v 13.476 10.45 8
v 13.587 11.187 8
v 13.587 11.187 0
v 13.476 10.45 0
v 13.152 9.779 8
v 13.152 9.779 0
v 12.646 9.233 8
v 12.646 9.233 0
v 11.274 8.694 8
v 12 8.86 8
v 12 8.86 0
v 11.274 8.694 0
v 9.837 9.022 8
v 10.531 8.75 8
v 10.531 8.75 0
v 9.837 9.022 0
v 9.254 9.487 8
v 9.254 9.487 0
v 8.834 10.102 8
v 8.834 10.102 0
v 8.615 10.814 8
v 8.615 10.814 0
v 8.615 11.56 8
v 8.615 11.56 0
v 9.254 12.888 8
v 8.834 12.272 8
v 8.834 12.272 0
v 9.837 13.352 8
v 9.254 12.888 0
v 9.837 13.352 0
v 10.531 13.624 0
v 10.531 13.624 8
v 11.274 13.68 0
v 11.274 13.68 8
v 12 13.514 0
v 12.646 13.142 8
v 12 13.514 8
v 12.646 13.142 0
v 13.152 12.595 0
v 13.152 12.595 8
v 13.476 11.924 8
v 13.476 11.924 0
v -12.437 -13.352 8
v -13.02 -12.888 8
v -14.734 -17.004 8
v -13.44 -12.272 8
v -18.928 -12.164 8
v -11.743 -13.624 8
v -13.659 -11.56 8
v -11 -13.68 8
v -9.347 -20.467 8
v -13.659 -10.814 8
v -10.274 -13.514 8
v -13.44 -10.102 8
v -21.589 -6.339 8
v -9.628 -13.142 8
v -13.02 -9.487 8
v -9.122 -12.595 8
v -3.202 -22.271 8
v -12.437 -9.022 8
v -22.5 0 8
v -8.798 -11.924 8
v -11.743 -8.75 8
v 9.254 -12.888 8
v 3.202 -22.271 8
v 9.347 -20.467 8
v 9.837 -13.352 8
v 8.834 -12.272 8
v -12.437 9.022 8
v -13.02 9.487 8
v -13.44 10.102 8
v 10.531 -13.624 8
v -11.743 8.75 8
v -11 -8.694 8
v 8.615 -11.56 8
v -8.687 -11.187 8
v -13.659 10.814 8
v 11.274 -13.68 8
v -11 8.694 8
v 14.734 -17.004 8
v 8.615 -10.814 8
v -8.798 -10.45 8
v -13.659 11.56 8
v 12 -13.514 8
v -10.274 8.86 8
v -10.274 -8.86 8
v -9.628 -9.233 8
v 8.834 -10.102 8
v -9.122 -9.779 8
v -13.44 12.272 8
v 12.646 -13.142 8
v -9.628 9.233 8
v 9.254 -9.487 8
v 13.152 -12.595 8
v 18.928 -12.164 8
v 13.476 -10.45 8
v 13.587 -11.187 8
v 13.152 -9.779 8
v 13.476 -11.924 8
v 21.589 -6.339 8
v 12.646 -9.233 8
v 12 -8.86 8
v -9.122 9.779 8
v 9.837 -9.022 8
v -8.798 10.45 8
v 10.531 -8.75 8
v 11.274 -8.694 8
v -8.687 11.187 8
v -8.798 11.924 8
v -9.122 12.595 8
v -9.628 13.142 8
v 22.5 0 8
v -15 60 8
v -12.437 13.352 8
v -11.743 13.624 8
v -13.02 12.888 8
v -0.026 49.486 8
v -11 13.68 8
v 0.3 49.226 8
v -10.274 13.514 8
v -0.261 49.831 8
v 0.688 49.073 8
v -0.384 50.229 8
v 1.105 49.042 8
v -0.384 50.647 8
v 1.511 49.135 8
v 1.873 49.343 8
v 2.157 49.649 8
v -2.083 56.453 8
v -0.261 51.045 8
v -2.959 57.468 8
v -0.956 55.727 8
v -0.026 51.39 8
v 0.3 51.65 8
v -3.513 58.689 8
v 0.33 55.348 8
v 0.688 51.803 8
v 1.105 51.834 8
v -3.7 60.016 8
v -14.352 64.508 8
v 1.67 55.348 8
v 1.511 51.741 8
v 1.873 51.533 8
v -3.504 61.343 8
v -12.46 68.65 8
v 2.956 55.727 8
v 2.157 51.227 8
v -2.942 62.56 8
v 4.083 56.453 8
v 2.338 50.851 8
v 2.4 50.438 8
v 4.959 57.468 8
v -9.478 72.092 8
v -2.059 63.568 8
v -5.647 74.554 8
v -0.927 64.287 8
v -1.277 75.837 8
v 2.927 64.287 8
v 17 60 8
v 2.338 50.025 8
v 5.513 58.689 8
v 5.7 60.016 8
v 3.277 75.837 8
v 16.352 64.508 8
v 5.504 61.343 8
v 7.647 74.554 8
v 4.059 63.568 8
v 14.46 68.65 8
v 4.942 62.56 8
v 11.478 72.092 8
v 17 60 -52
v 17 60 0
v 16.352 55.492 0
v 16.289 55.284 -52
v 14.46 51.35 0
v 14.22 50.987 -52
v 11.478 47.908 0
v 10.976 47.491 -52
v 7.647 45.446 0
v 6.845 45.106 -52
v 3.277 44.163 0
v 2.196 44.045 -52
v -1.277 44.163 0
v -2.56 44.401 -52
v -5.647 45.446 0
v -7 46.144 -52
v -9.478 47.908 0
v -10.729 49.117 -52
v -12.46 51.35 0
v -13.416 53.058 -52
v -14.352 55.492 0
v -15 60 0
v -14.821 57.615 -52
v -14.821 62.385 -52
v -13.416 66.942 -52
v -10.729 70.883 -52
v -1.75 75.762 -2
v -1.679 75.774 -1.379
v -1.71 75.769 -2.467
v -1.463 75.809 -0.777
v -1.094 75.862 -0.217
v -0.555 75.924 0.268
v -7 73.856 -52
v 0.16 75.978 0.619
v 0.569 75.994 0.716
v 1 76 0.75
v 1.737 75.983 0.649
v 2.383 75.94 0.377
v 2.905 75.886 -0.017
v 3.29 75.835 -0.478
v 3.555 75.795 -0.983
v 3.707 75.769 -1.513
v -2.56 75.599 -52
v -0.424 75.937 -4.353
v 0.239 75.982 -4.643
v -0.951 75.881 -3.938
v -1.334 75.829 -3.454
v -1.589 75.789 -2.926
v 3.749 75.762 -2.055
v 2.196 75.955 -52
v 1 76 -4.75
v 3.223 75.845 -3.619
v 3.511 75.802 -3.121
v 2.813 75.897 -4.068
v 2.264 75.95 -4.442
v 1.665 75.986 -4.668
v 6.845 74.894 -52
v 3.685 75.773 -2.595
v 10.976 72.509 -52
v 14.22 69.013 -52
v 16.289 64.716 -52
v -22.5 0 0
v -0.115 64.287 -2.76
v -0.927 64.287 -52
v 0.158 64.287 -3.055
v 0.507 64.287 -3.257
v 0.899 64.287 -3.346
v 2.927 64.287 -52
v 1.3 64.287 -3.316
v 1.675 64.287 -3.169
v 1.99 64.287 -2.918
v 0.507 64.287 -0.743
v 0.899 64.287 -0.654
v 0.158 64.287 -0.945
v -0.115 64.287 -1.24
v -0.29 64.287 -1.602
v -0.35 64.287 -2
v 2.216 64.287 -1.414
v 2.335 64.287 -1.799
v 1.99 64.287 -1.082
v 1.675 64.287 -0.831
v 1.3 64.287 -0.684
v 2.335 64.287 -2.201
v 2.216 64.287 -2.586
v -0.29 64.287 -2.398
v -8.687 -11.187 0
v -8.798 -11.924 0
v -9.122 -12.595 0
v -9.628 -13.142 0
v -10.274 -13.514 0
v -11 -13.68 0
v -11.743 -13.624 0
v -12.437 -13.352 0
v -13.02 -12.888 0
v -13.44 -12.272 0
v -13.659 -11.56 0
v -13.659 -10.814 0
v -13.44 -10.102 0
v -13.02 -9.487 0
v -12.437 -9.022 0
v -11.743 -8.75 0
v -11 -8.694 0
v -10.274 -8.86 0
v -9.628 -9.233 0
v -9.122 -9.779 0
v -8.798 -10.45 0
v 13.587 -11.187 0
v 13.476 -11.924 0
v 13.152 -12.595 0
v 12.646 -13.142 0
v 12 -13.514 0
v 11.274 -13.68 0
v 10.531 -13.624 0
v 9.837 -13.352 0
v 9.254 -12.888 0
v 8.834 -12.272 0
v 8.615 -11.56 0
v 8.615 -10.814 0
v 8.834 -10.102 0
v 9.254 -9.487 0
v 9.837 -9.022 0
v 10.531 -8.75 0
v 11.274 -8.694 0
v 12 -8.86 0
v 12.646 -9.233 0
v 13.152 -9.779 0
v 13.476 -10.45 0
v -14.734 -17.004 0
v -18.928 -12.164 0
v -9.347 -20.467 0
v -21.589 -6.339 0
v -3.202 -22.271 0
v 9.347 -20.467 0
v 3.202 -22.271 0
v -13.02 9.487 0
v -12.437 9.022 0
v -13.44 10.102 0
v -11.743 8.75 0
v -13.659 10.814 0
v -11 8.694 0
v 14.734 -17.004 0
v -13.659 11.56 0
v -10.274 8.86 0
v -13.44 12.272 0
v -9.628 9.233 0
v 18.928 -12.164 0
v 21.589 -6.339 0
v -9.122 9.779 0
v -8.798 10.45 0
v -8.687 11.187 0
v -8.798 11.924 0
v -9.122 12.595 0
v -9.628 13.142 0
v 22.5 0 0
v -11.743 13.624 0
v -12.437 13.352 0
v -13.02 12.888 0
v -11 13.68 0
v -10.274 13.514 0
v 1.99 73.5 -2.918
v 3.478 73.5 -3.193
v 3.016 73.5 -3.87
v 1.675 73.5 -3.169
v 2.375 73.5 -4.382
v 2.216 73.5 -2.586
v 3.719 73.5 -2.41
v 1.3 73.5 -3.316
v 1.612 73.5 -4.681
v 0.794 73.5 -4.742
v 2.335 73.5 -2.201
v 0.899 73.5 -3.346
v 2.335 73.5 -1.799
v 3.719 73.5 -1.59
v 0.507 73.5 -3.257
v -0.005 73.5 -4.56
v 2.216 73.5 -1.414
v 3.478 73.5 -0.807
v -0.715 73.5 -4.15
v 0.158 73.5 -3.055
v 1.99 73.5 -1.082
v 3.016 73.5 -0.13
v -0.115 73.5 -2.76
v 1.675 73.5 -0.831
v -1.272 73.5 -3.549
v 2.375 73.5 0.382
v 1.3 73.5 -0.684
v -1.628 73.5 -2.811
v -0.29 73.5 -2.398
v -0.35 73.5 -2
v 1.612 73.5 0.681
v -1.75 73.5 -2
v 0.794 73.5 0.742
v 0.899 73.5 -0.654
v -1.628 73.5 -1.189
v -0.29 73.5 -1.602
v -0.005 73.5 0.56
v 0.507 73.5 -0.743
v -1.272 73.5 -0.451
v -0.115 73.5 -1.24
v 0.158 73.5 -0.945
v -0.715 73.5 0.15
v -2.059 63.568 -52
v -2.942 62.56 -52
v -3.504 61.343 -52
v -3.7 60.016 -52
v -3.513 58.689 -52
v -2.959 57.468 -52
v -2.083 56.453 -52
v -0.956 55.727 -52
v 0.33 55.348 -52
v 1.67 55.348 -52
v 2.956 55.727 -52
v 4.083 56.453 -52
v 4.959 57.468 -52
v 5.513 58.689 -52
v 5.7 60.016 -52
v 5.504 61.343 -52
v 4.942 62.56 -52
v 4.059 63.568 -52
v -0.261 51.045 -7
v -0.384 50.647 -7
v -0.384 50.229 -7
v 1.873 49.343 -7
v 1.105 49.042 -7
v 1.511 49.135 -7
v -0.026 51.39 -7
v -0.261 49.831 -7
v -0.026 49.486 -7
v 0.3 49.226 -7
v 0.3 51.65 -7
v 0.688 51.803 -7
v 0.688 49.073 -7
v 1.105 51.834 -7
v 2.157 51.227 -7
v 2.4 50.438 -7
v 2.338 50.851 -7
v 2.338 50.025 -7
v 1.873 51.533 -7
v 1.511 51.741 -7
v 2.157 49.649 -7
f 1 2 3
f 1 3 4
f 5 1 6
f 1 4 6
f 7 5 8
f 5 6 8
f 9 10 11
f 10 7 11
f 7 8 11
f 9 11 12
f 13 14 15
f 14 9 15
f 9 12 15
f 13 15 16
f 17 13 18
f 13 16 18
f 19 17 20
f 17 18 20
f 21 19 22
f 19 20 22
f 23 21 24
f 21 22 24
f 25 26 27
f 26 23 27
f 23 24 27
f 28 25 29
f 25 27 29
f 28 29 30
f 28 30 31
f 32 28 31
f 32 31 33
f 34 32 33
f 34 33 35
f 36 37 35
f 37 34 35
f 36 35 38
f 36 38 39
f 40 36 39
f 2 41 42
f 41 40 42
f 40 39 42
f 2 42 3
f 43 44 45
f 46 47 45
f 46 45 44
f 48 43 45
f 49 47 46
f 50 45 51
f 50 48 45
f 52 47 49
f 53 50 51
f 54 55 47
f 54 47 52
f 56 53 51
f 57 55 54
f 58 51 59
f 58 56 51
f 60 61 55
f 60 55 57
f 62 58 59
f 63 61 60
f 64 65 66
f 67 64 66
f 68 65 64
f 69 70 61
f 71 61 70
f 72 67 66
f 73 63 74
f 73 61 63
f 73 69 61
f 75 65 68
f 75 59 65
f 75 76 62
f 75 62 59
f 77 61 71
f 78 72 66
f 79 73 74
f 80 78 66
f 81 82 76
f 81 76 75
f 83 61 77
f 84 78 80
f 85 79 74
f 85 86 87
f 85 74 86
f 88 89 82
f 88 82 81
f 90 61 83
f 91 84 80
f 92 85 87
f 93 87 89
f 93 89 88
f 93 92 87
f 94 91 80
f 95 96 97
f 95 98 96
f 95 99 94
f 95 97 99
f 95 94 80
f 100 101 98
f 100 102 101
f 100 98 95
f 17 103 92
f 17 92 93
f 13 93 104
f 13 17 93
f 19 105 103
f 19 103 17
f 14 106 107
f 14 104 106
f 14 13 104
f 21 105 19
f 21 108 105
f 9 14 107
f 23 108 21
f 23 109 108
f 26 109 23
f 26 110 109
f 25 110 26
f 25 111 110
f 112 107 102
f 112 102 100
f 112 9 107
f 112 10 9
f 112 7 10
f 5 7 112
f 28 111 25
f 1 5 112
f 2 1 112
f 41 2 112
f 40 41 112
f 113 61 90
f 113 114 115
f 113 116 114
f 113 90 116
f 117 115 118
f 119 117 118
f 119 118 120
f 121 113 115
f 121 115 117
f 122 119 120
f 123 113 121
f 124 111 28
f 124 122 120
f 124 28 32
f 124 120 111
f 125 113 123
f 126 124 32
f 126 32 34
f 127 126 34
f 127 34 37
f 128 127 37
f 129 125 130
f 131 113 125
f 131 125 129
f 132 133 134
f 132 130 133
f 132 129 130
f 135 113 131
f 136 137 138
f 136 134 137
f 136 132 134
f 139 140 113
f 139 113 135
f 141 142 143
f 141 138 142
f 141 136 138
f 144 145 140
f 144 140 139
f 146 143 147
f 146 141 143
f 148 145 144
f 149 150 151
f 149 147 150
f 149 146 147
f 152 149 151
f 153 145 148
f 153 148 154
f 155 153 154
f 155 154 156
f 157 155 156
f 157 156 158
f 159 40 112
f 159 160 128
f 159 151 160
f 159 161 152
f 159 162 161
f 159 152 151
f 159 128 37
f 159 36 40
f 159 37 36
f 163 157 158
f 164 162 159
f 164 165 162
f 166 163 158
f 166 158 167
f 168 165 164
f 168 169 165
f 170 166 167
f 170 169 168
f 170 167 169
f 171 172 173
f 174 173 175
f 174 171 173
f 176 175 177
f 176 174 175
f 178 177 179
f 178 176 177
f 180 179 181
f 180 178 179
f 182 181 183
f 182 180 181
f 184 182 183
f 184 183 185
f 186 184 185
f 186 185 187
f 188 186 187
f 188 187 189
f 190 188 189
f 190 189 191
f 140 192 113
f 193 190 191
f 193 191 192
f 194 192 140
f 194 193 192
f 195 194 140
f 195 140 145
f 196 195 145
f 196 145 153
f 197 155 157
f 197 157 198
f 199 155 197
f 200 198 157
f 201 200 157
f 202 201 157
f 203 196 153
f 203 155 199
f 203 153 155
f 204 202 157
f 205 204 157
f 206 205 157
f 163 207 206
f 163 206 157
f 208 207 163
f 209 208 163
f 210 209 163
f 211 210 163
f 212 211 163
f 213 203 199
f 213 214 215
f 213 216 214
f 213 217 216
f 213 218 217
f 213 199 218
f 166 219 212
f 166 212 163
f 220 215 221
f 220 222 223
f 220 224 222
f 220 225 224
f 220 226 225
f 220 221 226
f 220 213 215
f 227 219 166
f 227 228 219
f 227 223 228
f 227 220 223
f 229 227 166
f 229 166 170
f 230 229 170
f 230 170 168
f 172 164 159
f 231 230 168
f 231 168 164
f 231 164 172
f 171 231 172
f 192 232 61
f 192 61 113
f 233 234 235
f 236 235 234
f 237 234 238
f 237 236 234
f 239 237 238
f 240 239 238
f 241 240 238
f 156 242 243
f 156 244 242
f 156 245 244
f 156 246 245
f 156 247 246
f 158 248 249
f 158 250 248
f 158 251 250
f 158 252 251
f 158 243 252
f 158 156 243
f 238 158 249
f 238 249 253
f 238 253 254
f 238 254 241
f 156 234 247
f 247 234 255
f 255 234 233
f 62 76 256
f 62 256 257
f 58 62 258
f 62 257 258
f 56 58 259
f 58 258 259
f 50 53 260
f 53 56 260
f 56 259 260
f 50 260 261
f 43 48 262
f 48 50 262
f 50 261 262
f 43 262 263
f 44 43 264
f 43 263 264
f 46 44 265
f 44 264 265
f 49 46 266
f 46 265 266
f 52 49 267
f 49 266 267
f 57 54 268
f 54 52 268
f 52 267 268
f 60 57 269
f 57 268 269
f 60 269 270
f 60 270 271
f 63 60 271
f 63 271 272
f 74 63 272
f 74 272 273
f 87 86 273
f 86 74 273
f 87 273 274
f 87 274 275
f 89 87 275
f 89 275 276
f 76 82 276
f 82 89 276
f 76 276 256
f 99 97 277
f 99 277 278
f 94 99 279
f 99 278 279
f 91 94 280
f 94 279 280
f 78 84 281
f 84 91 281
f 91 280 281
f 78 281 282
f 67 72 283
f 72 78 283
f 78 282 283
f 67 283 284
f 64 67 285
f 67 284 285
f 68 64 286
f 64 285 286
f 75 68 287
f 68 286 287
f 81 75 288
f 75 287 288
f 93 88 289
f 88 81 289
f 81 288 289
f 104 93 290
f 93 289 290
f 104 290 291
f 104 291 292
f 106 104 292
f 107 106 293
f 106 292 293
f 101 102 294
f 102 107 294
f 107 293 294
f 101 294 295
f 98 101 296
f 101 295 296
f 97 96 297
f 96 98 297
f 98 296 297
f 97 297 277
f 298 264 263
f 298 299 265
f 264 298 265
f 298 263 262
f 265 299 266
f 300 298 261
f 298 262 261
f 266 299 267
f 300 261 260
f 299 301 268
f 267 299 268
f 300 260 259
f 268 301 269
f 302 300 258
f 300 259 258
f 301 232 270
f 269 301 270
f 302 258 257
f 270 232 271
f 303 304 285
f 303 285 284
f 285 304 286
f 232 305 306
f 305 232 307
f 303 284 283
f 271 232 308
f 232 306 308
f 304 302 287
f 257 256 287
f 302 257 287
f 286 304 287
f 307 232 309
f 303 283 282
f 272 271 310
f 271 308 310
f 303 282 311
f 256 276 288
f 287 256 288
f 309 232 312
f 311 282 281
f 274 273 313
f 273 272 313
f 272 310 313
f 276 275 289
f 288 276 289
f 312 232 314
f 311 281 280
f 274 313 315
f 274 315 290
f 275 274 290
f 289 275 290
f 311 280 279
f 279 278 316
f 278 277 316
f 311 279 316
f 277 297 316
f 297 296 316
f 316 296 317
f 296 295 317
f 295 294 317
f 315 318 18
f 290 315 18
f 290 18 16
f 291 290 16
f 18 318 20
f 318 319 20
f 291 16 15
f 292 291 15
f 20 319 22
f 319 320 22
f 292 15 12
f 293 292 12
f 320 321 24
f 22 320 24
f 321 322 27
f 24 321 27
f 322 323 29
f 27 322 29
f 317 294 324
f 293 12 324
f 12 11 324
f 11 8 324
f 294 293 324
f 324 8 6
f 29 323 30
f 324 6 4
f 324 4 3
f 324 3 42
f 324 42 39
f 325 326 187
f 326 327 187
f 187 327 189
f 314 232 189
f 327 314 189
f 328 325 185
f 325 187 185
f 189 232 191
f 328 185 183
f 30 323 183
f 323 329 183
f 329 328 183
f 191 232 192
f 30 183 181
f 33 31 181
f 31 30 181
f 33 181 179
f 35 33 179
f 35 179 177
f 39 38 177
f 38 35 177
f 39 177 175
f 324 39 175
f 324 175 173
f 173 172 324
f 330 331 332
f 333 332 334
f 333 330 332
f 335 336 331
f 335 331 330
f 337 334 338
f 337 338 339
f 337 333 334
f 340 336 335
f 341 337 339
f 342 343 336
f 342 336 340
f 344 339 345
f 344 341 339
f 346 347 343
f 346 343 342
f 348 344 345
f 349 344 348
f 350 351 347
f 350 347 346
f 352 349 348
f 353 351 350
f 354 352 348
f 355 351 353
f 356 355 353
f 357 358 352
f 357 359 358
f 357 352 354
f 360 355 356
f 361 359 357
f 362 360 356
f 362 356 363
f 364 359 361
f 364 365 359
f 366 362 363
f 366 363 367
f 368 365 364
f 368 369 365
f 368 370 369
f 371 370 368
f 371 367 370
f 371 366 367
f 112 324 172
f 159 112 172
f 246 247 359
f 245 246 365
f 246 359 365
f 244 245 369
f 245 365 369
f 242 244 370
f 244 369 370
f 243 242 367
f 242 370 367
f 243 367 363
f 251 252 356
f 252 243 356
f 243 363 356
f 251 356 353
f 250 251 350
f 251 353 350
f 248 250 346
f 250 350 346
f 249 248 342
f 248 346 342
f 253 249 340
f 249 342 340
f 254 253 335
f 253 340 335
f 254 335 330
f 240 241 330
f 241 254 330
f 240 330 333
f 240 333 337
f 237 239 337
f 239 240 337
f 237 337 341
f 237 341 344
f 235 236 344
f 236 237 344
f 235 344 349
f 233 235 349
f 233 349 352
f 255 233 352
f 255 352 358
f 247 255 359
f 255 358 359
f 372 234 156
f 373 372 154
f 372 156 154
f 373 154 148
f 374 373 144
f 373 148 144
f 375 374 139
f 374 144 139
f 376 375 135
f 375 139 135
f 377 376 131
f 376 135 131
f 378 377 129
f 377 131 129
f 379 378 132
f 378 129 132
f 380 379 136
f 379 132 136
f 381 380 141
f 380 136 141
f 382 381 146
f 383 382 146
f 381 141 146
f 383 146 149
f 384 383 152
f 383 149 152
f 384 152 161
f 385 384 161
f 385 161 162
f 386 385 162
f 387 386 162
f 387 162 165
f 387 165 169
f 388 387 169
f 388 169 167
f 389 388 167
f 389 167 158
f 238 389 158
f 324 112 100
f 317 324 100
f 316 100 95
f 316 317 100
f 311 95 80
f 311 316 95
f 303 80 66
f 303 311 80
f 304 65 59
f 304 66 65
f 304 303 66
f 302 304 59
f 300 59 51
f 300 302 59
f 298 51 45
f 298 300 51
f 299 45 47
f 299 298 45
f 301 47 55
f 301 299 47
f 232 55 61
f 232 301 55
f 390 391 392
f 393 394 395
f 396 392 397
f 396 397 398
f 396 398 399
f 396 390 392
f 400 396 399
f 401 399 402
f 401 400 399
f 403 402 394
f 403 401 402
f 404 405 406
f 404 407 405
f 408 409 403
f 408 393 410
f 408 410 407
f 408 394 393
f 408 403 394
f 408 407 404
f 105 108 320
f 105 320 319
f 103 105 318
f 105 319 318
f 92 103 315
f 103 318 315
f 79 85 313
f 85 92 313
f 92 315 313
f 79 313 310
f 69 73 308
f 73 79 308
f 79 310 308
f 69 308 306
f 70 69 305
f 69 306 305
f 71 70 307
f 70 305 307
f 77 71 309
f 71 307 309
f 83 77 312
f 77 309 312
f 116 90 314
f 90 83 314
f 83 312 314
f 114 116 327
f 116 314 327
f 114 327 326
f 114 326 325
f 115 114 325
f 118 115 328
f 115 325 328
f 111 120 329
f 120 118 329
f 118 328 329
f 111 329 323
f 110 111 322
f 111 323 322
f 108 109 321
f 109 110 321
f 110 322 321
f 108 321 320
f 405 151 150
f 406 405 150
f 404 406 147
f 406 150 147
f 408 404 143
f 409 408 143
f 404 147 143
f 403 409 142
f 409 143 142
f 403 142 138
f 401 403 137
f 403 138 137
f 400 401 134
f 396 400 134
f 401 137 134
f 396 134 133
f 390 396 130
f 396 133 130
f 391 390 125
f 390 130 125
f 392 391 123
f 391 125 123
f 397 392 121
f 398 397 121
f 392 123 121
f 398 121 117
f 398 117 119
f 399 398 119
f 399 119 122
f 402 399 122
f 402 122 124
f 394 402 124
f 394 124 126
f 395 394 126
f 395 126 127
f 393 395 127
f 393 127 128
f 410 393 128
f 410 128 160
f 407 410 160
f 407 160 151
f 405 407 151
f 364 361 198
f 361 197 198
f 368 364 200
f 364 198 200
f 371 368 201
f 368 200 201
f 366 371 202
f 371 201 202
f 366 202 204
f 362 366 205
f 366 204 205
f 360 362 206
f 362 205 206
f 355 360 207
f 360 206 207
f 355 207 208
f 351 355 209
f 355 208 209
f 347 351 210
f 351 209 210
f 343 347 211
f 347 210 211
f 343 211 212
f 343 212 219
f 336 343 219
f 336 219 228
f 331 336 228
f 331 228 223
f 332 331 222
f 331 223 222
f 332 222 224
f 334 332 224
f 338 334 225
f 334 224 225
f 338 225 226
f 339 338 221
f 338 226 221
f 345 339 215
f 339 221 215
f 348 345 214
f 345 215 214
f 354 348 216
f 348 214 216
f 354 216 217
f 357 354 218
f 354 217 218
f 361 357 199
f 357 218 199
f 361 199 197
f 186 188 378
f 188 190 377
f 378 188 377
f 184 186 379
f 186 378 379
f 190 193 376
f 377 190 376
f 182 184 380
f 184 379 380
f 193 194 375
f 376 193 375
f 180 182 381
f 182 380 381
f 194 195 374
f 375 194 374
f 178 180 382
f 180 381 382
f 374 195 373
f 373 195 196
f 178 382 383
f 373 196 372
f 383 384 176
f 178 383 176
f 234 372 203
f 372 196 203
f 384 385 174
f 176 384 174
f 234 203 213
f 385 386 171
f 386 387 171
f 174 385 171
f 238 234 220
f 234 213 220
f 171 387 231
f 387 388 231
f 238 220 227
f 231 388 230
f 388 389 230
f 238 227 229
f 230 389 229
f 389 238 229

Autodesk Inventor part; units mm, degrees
ref_plane "YZ Plane" through (0, 0, 0) normal (1, 0, 0) x (0, 1, 0)
ref_plane "XZ Plane" through (0, 0, 0) normal (0, 1, 0) x (-1, 0, 0)
sketch "Sketch1" plane through (0, 0, 0) normal (0, 0, 1) x (1, 0, 0)
  arc A0 (-22.5, 0) -> (22.5, 0) centre (0, 0) ccw
  circle A1 centre (-11.1871, 11.1871) radius 2.5
  arc A2 (17, 60) -> (-15, 60) centre (1, 60) ccw
  line L0 (22.5, 0) -> (17, 60)
  line L1 (-22.5, 0) -> (-15, 60)
  circle A3 centre (11.0869, 11.1871) radius 2.5
  line L2 (-1.4379, 0) -> (3.0127, 0) construction
  circle A4 centre (-11.1871, -11.1871) radius 2.5
  circle A5 centre (11.0869, -11.1871) radius 2.5
  dimension "d0" = 45
  dimension "d3" = 5
  dimension "d29" = 32
  dimension "d57" = 5
  dimension "d58" = 22.274
  dimension "d59" = 15.821
extrude "Extrusion1" add sketch "Sketch1" along normal blind 8
sketch "Sketch5" plane through (0, 0, 8) normal (0, 0, 1) x (1, 0, 0)
  arc A0 (17, 60) -> (-15, 60) centre (1, 60) ccw projected
  circle A1 centre (1, 60) radius 16
  point P0 (0, 0)
  point P1 (-15, 60)
  dimension "d44" = 32
extrude "Extrusion3" add sketch "Sketch5" against normal blind 60
sketch "Sketch6" plane through (0, 0, 8) normal (0, 0, 1) x (1, 0, 0)
  arc A0 (17, 60) -> (-15, 60) centre (1, 60) ccw projected
  arc A1 (-0.9268, 64.2869) -> (2.9268, 64.2869) centre (1, 60) ccw
  line L0 (-0.9268, 64.2869) -> (2.9268, 64.2869)
  point P0 (0, 0)
  point P1 (1, 55.3)
  point P2 (1, 64.2869)
  dimension "d32" = 9.4
  dimension "d43" = 4.2869
extrude "Extrusion4" cut sketch "Sketch6" against normal through all
ref_plane "Work Plane2" through (1, 76, 8) normal (0, 1, 0) x (-1, 0, 0)
sketch "Sketch9" plane through (1, 76, 8) normal (0, 1, 0) x (-1, 0, 0)
  line L0 (16, 0) -> (-16, 0) projected
  line L1 (0, 0) -> (0, -10)
  circle A0 centre (0, -10) radius 1.35
  point P0 (1, -8)
  dimension "d45" = 10
  dimension "d46" = 2.7
extrude "Extrusion7" cut sketch "Sketch9" against normal blind 12
sketch "Sketch10" plane through (1, 76, 8) normal (0, 1, 0) x (-1, 0, 0)
  circle A0 centre (0, -10) radius 1.35 projected
  circle A1 centre (0, -10) radius 2.75
  point P0 (1, -8)
  dimension "d49" = 5.5
extrude "Extrusion8" cut sketch "Sketch10" against normal blind 2.5
sketch "Sketch13" plane through (0, 0, 8) normal (0, 0, 1) x (1, 0, 0)
  circle A0 centre (1, 50.438) radius 1.4
  arc A1 (-0.9268, 64.2869) -> (2.9268, 64.2869) centre (1, 60) ccw projected
  point P0 (0, 0)
  dimension "d60" = 2.8
  dimension "d61" = 9.562
extrude "Extrusion11" cut sketch "Sketch13" against normal blind 15
properties part number "pen_holder" material "LCP Plastic"
